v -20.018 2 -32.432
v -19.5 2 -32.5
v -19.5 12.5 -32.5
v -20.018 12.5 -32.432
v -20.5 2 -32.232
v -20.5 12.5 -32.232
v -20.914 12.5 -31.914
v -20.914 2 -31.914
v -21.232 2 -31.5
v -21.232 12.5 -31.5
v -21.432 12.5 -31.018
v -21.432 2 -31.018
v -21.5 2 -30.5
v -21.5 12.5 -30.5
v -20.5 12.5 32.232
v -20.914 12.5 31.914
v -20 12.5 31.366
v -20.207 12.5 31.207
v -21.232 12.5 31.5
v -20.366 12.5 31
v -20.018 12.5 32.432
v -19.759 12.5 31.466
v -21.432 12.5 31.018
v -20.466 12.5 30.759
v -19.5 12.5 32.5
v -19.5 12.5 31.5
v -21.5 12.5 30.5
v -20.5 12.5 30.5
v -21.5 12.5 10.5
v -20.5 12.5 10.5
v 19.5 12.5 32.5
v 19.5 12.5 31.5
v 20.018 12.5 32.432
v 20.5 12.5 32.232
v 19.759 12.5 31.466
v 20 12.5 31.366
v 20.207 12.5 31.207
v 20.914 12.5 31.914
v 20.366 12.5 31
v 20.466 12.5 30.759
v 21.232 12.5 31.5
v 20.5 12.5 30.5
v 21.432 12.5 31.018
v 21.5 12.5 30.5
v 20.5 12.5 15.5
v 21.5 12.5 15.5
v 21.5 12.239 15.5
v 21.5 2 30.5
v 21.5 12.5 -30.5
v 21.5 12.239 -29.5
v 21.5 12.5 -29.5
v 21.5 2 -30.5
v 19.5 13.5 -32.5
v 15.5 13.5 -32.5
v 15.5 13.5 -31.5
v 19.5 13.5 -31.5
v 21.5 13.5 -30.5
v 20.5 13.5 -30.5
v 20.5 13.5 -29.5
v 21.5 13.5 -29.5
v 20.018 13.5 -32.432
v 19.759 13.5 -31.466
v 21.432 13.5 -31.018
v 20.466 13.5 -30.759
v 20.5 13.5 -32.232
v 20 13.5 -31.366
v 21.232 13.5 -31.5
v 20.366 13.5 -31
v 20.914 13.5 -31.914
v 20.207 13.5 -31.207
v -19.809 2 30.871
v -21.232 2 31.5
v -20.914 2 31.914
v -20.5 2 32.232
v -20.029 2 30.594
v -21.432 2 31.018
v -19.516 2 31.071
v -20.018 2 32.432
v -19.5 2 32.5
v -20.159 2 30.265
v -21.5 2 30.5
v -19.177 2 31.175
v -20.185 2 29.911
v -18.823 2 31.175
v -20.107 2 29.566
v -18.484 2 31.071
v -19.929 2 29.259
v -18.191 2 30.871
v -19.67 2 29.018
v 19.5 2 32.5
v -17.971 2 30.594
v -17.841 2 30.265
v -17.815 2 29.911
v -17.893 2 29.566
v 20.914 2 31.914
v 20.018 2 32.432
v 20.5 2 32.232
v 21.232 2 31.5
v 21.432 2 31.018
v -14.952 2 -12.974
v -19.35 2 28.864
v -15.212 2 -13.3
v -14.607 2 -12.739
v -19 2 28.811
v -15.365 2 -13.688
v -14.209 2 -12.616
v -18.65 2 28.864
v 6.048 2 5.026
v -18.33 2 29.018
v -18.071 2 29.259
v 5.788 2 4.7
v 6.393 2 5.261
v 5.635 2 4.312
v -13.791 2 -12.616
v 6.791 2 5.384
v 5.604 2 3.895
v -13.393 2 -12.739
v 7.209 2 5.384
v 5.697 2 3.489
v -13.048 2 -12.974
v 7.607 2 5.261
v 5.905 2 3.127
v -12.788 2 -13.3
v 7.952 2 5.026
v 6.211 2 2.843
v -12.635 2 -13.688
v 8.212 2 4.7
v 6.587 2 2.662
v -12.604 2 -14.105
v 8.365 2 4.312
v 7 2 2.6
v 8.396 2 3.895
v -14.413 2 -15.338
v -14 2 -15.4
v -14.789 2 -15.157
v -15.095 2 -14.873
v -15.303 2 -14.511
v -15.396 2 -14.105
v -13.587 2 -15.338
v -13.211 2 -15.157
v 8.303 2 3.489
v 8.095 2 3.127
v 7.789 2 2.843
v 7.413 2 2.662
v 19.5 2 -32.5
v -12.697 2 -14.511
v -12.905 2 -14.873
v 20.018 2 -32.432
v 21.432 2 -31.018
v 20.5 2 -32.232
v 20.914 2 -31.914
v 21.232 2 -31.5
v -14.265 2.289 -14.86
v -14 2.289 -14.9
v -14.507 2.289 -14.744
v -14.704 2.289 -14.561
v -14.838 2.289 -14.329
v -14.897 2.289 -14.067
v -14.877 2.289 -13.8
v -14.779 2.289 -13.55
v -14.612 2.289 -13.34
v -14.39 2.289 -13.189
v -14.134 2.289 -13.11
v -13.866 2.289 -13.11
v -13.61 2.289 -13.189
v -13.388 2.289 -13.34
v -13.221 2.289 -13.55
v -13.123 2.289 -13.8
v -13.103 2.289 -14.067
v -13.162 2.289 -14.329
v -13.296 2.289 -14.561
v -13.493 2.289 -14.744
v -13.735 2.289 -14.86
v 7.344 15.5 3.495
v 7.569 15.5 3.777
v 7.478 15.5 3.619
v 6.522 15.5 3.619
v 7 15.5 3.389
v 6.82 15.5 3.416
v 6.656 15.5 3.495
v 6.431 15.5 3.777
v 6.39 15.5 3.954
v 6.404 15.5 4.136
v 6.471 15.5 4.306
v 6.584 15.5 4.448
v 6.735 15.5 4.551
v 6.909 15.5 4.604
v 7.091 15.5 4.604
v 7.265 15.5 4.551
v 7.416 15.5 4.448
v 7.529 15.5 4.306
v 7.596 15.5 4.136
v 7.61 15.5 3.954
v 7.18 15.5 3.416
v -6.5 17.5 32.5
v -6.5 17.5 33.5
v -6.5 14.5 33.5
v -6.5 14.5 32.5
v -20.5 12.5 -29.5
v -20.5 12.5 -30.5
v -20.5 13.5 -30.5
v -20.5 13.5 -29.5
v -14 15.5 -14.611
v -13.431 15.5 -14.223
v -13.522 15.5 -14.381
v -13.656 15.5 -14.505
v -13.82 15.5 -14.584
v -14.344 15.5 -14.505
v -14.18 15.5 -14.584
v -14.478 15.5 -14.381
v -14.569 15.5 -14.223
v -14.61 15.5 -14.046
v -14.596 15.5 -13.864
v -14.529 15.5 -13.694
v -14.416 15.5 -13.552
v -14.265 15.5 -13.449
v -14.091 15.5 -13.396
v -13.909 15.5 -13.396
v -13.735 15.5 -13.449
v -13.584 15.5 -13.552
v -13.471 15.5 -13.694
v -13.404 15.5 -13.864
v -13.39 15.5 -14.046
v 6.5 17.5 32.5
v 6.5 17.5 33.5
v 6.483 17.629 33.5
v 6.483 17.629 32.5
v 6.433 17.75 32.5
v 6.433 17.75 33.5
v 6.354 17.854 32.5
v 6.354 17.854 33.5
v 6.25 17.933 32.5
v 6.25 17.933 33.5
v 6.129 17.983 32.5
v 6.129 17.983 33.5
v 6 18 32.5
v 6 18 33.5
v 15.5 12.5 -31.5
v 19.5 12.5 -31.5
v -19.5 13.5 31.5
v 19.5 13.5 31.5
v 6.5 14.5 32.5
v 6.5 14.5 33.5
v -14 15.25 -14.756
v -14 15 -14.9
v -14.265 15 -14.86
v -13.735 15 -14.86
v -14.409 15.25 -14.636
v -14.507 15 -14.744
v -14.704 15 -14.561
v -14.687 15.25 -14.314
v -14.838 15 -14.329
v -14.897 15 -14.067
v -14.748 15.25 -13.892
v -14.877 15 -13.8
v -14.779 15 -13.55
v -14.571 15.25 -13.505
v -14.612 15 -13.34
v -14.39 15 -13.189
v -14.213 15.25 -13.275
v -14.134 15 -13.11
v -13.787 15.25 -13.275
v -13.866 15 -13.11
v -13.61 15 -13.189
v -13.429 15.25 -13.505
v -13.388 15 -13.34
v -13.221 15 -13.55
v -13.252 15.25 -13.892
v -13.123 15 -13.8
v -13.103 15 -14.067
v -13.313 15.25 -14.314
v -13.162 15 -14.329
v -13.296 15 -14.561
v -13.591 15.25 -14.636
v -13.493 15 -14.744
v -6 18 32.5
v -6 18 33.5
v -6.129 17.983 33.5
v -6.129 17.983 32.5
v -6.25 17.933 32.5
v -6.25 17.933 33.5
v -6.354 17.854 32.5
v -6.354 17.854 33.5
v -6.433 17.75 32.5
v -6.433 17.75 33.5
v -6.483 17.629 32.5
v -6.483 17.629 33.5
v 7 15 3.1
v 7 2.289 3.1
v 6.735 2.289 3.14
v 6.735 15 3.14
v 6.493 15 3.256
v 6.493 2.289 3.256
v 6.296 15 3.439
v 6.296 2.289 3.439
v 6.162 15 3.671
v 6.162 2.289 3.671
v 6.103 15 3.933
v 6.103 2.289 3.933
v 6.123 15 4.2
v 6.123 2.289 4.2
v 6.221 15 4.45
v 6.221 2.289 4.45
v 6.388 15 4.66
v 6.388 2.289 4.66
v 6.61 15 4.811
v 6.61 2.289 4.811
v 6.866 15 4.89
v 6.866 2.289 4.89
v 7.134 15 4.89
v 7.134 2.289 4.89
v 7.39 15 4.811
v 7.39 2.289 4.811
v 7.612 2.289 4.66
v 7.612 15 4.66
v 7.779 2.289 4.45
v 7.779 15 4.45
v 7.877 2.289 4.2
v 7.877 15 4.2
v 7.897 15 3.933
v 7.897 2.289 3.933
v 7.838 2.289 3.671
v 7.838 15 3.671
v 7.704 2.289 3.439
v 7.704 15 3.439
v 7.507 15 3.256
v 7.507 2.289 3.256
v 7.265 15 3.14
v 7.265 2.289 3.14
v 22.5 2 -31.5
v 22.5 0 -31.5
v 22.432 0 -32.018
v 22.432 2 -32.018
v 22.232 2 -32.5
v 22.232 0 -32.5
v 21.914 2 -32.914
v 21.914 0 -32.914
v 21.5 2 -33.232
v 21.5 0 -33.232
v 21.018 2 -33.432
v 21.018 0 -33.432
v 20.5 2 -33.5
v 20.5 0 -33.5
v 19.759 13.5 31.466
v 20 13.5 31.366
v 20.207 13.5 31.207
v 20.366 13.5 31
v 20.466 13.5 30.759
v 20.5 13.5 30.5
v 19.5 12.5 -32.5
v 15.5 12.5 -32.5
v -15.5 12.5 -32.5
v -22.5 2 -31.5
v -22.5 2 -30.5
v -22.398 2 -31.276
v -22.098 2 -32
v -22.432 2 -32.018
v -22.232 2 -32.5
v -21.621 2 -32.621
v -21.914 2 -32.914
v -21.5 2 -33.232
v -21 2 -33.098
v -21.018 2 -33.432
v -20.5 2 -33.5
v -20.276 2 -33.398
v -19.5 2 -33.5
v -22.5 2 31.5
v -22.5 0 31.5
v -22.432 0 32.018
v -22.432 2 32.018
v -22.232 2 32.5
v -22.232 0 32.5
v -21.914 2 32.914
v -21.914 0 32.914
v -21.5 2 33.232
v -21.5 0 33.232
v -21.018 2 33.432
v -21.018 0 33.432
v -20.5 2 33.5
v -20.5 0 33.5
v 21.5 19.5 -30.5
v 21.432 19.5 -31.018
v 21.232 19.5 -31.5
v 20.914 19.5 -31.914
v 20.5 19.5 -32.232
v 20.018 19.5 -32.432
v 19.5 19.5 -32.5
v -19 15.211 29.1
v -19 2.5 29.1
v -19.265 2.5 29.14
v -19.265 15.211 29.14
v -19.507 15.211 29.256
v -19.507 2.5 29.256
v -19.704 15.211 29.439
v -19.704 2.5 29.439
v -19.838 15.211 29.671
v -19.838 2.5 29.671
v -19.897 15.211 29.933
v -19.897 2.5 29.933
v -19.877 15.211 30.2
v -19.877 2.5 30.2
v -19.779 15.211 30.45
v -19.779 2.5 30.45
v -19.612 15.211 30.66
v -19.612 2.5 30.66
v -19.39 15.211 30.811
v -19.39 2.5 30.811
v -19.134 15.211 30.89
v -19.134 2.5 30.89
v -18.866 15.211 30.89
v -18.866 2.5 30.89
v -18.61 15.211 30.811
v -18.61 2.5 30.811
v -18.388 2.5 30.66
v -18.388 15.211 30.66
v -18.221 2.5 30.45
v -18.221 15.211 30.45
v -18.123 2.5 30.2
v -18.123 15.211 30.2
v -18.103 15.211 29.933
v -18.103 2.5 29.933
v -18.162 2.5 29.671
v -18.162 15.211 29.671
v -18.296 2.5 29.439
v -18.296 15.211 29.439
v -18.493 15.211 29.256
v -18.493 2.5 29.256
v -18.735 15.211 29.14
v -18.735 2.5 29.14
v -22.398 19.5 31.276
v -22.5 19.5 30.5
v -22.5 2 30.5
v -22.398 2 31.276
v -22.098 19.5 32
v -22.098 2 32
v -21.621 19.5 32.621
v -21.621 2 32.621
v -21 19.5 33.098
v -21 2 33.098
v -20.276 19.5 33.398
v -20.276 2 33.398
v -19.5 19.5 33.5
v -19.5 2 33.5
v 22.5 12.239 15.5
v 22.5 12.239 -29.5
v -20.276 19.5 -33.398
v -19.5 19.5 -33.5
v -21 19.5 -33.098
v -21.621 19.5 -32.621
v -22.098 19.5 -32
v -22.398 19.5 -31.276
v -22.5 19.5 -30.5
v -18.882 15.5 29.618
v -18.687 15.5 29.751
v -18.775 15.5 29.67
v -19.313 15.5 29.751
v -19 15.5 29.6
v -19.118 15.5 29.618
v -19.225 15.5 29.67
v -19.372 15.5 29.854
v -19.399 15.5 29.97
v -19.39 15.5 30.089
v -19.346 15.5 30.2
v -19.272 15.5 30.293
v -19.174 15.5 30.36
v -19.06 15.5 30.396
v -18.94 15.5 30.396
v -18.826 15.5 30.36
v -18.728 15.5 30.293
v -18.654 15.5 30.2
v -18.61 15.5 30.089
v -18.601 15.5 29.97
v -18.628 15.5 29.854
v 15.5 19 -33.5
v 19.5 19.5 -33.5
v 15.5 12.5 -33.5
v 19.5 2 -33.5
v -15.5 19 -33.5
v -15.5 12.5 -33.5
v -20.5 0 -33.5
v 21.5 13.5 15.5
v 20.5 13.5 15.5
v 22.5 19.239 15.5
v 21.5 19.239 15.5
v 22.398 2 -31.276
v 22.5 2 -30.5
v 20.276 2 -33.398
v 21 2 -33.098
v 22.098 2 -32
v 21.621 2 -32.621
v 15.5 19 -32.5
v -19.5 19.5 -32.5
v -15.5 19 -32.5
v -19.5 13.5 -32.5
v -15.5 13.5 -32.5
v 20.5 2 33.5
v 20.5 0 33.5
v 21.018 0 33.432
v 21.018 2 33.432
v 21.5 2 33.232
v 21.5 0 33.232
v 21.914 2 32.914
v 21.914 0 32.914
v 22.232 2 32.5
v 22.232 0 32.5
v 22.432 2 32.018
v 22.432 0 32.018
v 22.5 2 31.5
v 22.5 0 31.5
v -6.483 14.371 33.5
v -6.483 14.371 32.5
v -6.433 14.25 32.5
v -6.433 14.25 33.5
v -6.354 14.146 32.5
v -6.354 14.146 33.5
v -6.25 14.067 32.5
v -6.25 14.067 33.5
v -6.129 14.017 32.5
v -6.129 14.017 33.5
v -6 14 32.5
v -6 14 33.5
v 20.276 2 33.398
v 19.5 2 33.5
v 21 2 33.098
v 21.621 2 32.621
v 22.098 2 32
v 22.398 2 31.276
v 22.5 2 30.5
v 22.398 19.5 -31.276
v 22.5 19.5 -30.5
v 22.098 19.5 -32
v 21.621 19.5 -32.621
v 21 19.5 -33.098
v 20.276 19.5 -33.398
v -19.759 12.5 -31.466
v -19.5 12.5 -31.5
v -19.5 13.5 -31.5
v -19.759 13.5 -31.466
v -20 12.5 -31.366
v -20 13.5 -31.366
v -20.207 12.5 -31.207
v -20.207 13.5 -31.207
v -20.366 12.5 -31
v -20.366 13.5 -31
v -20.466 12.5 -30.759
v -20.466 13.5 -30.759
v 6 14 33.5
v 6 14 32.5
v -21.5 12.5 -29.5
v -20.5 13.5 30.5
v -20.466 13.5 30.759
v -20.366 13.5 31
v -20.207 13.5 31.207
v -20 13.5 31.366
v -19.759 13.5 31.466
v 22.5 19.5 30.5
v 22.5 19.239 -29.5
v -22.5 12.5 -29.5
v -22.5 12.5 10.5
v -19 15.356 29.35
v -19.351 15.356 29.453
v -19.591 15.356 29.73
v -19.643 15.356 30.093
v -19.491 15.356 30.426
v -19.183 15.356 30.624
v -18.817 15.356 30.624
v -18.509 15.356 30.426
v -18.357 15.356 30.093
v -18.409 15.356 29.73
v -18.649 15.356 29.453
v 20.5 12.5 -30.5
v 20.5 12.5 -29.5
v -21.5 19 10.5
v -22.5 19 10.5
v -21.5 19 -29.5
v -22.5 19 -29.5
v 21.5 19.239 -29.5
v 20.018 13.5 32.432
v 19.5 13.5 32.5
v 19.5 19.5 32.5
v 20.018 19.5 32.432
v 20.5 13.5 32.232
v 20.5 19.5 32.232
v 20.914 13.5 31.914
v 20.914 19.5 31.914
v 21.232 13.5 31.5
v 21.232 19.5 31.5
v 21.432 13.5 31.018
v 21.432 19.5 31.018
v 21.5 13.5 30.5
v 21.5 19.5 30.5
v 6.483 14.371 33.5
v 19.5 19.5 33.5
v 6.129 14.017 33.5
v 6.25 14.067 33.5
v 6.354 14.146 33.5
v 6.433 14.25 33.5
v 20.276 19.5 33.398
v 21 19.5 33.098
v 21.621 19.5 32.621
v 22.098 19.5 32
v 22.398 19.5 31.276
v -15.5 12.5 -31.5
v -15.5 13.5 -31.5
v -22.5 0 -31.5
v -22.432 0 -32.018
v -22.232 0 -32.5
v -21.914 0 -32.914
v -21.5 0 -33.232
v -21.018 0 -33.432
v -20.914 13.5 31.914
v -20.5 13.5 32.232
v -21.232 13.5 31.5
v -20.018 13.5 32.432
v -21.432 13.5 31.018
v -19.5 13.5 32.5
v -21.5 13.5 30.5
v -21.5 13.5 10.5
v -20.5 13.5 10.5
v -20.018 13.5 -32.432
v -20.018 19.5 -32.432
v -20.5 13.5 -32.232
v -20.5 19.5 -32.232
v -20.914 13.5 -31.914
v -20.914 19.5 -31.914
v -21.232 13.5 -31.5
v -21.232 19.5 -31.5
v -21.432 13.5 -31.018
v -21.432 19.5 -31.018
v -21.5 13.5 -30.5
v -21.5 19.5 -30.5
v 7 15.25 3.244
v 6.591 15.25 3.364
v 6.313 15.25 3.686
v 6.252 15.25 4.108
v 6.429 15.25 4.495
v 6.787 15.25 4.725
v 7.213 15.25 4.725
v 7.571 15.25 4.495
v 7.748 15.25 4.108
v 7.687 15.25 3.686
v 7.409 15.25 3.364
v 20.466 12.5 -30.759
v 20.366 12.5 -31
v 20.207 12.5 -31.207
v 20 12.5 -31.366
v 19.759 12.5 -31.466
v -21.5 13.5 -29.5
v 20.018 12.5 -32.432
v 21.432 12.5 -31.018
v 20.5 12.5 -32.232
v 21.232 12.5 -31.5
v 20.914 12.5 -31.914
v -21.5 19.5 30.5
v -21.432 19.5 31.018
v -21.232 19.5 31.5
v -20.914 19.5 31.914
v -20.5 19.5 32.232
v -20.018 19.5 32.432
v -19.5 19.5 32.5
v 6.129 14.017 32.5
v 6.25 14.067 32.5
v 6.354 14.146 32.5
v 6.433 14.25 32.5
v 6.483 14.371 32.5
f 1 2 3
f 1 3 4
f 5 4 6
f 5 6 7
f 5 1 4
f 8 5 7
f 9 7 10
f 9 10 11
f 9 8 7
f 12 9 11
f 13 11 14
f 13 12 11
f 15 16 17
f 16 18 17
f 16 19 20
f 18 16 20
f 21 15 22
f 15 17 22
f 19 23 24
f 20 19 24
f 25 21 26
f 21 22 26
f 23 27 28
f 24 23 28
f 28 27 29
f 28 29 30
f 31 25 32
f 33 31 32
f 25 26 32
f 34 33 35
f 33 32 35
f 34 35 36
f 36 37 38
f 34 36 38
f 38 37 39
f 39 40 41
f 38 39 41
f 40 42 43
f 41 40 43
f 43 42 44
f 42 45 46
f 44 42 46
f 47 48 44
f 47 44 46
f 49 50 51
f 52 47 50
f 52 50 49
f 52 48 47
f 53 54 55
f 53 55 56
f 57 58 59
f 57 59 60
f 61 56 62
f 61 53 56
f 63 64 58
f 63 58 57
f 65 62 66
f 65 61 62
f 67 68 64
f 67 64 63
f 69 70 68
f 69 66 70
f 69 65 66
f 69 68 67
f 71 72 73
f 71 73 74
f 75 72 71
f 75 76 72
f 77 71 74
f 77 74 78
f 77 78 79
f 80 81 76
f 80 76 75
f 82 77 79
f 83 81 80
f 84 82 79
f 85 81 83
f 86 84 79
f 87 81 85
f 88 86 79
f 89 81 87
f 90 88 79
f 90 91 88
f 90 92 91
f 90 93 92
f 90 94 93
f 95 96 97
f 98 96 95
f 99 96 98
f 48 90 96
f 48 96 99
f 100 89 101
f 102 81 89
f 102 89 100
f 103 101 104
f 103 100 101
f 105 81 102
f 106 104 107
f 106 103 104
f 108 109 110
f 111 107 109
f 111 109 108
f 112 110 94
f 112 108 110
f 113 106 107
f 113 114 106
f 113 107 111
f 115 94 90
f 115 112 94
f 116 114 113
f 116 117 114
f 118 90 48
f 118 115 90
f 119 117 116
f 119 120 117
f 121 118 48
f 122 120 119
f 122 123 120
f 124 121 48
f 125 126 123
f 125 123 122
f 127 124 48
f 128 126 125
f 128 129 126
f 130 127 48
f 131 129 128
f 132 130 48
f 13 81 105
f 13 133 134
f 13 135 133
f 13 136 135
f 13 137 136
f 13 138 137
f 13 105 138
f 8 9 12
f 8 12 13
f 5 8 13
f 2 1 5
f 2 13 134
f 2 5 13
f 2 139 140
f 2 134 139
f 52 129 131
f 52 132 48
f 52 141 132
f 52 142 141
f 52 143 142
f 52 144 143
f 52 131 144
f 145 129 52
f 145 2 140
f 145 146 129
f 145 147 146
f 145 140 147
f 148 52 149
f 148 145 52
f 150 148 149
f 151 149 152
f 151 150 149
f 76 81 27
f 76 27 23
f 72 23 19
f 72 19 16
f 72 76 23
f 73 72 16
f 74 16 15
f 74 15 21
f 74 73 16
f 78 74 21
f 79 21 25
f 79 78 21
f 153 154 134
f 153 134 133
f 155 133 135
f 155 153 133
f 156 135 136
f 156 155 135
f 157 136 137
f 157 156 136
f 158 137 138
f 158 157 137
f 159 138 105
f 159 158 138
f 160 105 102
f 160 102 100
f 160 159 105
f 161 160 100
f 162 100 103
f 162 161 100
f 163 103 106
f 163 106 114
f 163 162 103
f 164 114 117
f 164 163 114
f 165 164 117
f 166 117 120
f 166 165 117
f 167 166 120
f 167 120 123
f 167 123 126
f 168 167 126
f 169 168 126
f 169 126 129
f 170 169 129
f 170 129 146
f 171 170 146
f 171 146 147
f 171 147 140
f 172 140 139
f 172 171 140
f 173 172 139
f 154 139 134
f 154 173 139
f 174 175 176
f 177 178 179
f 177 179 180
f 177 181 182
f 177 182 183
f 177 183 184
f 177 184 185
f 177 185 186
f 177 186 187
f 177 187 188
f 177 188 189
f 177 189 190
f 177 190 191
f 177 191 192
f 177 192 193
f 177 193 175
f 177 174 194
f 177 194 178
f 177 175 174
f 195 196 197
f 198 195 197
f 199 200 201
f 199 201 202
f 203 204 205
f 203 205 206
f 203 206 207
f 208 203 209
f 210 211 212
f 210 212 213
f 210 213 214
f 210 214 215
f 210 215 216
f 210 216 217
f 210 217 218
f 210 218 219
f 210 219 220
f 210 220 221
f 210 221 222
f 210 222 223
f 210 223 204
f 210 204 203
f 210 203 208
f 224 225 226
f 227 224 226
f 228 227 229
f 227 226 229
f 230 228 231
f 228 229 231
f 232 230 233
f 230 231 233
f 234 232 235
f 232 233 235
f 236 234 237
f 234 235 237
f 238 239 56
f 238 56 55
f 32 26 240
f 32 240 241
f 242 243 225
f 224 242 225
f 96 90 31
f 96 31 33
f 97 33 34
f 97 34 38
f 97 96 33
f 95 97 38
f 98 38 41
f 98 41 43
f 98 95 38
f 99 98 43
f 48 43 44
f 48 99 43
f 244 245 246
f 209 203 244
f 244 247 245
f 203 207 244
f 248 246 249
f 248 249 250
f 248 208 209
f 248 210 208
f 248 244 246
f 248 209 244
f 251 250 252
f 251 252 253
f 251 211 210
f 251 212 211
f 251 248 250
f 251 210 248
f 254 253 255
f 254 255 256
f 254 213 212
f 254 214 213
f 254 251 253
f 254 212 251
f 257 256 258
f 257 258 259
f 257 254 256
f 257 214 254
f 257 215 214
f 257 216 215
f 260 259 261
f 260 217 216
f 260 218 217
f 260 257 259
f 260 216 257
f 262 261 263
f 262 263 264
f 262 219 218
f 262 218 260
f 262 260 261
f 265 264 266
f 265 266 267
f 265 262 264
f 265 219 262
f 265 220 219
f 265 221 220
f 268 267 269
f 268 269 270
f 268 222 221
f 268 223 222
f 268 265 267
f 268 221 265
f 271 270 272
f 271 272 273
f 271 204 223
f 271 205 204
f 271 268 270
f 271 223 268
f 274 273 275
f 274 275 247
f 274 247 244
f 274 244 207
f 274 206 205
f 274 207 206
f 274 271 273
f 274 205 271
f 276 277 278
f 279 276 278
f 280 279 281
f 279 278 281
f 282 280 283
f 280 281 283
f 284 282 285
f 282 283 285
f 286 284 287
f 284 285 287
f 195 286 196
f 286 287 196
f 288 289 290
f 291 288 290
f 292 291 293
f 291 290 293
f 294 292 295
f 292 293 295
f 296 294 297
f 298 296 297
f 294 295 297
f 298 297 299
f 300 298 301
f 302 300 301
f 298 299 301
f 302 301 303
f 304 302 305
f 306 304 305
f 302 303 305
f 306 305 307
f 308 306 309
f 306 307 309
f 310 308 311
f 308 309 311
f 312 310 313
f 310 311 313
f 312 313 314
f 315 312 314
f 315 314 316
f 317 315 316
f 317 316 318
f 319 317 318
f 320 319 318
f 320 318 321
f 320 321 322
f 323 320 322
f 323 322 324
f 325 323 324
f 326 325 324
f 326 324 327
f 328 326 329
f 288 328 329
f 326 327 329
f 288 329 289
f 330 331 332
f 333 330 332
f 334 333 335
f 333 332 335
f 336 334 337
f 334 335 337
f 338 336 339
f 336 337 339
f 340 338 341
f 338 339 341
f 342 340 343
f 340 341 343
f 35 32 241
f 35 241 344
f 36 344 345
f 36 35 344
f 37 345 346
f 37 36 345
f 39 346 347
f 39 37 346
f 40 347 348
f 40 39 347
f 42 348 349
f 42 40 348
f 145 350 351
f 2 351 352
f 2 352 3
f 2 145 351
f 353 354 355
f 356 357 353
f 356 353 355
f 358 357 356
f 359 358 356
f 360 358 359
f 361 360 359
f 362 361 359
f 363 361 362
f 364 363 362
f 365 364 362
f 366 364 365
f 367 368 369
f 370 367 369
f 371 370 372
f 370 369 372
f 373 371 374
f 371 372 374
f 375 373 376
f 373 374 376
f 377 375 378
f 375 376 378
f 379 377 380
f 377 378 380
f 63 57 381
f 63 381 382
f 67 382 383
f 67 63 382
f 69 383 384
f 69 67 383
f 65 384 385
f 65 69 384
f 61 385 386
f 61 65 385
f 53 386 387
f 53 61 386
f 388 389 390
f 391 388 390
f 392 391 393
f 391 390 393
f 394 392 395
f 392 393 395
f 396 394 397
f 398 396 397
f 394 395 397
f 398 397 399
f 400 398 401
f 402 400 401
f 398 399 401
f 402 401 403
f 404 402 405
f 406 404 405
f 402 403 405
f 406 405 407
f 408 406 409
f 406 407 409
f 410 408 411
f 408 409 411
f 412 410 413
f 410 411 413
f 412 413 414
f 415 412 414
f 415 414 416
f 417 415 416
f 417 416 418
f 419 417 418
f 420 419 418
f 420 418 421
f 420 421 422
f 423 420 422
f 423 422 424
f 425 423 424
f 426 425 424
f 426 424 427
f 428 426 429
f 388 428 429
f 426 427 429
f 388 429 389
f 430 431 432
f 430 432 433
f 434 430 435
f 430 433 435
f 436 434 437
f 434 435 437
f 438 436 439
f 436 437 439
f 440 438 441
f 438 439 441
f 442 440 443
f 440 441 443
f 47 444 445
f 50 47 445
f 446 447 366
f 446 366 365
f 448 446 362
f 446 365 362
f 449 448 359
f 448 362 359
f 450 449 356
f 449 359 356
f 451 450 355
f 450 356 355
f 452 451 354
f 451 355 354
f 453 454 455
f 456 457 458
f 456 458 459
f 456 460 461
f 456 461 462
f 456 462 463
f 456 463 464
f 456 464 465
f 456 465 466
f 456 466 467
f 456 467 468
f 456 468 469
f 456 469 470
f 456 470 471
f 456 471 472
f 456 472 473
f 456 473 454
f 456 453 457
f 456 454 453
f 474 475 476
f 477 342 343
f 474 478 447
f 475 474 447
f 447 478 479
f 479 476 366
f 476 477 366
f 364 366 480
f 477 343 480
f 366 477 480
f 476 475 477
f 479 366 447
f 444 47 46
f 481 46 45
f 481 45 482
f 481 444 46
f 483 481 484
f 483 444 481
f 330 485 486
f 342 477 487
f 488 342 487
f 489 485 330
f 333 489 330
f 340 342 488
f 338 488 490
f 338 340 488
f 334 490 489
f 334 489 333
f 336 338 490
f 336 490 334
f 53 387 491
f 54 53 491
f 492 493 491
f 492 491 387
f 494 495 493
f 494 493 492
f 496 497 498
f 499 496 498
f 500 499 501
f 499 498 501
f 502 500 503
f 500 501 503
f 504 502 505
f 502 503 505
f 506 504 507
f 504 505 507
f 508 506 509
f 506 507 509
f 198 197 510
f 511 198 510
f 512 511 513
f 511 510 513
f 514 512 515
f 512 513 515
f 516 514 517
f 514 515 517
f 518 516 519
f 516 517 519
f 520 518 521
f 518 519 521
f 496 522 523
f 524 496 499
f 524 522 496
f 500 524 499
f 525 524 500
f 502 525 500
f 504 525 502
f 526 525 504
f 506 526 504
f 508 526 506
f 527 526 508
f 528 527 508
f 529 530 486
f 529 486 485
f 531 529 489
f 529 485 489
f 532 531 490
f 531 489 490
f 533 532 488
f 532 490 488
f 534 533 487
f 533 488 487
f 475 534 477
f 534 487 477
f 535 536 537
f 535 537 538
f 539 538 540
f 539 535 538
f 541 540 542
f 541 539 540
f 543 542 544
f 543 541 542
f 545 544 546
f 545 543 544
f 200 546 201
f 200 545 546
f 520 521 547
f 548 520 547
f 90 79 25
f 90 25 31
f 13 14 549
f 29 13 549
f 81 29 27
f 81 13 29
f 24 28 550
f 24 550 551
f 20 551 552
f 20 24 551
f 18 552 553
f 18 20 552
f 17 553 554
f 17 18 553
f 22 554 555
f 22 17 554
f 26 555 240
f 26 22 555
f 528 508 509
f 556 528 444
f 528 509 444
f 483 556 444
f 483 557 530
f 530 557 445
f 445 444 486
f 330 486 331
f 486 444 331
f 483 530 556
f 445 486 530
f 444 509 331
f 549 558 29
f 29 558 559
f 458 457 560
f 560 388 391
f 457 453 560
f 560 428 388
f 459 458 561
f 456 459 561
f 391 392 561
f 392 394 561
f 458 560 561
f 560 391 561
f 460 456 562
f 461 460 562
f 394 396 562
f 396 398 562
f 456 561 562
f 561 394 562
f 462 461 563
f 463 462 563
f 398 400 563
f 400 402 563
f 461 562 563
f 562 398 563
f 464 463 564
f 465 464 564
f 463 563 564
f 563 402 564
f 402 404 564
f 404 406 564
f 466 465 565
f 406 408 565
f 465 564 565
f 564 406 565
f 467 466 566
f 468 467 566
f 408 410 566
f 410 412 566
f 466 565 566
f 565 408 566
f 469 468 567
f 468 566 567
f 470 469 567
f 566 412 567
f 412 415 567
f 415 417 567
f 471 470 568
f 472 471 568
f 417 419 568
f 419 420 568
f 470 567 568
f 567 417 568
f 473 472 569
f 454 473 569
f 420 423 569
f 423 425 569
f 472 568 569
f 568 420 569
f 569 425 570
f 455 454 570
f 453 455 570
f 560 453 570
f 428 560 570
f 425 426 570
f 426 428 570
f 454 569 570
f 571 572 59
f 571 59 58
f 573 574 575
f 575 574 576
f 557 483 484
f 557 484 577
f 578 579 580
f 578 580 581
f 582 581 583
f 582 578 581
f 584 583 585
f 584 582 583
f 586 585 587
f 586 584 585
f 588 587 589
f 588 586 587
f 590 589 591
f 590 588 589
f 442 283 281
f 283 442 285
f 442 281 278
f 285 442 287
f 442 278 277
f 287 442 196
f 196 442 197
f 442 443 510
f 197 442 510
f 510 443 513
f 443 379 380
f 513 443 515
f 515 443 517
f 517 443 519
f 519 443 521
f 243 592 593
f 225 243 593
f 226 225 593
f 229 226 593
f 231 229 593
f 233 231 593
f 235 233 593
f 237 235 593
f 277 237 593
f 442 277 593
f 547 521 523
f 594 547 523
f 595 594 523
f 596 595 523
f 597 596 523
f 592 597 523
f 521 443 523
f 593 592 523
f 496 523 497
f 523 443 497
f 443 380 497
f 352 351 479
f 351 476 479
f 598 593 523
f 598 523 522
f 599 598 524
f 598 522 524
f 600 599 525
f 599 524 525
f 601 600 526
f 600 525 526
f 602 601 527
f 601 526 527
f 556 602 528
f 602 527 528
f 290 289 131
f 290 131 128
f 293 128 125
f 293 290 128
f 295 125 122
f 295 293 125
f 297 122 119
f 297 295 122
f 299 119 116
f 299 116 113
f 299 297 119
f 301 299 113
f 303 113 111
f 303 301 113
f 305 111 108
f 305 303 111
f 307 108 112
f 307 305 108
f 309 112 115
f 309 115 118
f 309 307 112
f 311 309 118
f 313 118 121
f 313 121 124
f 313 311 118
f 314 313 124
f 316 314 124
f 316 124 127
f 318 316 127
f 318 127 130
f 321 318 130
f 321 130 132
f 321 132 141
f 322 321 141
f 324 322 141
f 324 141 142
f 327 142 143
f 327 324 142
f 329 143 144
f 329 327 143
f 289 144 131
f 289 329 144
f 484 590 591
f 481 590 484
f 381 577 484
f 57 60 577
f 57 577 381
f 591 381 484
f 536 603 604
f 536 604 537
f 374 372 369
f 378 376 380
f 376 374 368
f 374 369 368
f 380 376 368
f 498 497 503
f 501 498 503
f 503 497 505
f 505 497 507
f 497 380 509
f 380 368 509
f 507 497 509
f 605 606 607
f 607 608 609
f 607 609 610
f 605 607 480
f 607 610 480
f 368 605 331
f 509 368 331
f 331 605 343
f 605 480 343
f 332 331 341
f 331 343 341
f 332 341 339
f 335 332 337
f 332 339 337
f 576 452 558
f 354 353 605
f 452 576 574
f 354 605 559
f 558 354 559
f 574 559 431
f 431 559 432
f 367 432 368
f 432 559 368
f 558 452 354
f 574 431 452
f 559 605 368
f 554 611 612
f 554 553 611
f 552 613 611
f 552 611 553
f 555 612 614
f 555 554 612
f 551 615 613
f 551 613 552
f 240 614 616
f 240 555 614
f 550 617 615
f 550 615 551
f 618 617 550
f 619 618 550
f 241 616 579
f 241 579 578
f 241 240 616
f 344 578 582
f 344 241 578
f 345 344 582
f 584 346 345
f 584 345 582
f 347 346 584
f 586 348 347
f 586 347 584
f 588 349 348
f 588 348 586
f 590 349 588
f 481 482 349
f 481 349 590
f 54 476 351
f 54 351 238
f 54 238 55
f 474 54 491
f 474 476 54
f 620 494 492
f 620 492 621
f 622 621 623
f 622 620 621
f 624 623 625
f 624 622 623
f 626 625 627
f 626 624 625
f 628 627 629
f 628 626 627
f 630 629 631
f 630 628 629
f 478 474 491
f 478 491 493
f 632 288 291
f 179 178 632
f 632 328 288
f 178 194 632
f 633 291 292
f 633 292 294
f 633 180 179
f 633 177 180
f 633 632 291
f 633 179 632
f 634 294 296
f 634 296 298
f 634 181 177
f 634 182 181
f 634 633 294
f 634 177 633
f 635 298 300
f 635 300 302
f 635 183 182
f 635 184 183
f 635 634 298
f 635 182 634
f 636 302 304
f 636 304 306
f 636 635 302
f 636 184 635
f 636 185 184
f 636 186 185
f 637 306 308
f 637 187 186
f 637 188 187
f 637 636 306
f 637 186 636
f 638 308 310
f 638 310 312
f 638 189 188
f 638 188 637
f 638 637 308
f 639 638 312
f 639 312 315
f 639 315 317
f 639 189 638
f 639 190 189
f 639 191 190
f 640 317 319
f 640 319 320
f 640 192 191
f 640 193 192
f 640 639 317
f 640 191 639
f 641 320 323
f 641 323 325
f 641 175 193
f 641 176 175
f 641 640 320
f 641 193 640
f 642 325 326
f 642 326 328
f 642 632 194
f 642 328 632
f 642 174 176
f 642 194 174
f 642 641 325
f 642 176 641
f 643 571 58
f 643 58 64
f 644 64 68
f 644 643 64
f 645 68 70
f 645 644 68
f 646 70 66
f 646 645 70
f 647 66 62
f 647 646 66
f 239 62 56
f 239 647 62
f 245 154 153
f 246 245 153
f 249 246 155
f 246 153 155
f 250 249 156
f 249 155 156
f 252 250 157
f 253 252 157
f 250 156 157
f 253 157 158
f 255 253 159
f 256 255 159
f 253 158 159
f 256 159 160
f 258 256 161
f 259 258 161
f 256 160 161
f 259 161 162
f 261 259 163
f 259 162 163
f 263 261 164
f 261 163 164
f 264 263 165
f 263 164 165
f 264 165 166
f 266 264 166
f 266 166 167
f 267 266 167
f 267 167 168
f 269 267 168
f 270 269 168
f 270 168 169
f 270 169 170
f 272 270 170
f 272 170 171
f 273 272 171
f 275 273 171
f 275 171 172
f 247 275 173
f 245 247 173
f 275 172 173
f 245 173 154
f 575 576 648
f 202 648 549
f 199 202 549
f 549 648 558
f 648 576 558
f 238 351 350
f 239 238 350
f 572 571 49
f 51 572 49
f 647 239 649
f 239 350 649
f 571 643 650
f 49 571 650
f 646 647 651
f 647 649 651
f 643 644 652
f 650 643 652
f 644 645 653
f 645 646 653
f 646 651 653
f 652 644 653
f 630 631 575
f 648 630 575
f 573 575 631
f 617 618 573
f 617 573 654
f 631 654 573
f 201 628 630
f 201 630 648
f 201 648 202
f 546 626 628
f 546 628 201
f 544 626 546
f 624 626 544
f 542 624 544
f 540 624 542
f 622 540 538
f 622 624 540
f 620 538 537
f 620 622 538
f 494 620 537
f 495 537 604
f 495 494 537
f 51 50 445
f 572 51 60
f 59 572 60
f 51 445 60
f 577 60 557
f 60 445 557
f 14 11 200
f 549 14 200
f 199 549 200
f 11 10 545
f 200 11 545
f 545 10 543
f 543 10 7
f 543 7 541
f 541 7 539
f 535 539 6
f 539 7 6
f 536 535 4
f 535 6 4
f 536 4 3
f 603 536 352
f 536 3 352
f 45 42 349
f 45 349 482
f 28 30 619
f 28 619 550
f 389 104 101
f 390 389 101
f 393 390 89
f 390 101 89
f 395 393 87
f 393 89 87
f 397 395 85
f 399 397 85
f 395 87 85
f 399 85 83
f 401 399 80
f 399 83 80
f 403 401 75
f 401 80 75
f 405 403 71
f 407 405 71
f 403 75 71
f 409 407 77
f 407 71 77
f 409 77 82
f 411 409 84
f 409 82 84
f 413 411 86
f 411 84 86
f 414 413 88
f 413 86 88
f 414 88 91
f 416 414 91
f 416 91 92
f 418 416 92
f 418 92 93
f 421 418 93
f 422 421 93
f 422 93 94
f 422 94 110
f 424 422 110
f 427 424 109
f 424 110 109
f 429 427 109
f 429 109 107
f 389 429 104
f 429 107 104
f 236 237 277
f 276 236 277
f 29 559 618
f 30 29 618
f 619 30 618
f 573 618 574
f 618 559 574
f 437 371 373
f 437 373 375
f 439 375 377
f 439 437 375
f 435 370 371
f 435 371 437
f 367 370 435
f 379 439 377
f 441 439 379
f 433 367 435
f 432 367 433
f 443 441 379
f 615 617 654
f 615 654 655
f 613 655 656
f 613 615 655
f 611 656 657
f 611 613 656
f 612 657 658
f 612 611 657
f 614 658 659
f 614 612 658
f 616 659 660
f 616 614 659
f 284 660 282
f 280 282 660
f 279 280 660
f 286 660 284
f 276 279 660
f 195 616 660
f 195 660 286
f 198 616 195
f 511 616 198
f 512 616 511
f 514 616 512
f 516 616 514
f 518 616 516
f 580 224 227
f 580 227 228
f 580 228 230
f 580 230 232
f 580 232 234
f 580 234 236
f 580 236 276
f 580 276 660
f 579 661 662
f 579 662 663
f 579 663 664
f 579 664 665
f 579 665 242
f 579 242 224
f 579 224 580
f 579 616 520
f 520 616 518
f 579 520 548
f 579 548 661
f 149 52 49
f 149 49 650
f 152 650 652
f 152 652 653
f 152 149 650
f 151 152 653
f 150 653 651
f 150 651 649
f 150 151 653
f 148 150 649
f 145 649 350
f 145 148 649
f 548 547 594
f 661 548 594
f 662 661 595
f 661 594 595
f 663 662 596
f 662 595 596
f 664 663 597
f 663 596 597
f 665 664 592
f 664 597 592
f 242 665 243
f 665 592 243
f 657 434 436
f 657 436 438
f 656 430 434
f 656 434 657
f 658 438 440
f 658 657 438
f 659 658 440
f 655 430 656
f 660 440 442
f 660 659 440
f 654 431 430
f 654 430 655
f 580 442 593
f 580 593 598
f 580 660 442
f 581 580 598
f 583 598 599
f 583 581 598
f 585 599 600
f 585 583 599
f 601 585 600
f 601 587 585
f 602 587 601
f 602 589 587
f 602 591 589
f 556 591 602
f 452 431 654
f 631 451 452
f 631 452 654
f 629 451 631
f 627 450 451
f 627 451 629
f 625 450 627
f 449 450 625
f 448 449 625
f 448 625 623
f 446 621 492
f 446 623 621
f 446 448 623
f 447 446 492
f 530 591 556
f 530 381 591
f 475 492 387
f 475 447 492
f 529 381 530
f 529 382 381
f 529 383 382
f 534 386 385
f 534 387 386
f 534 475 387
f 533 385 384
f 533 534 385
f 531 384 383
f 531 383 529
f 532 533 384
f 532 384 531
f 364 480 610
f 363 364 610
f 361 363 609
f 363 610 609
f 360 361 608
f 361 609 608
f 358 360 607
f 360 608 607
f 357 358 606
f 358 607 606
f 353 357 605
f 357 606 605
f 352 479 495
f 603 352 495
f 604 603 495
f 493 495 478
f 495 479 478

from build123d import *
from OCP.BRepFilletAPI import BRepFilletAPI_MakeChamfer

# Parameters (mm, degrees)
EXTRUDE_1_DEPTH     = 2
EXTRUDE_2_DEPTH     = 17.5
SKETCH_3_R          = 0.9
EXTRUDE_3_DEPTH     = 13.5
CHAMFER_2_SIZE      = 0.5
CHAMFER_2_SIZE2     = 0.288675135
CHAMFER_3_SIZE      = 0.5
CHAMFER_3_SIZE2     = 0.288675135
CHAMFER_4_SIZE      = 0.5
CHAMFER_4_SIZE2     = 0.288675135
EXTRUDE_5_DEPTH     = 1
CUT_EXTRUDE_1_REACH = 75.318
CUT_EXTRUDE_2_REACH = 61.393
SKETCH_7_W          = 45
SKETCH_7_H          = 7
CUT_EXTRUDE_3_REACH = 61.393
CUT_EXTRUDE_4_REACH = 75.318
SKETCH_9_W          = 31
SKETCH_9_H          = 6.5


with BuildPart() as part:
    # 草图1 → 凸台-拉伸1 (new body)
    with BuildSketch(Plane(origin=(0, 0, 0), x_dir=(1, 0, 0), z_dir=(0, 1, 0))):
        with BuildLine():
            Line((-22.5, 31.5), (-22.5, -31.5))
            ThreePointArc((-22.5, -31.5), (-21.914213562, -32.914213562), (-20.5, -33.5))
            Line((-20.5, -33.5), (20.5, -33.5))
            ThreePointArc((20.5, -33.5), (21.914213562, -32.914213562), (22.5, -31.5))
            Line((22.5, -31.5), (22.5, 31.5))
            ThreePointArc((22.5, 31.5), (21.914213562, 32.914213562), (20.5, 33.5))
            Line((20.5, 33.5), (-20.5, 33.5))
            ThreePointArc((-20.5, 33.5), (-21.914213562, 32.914213562), (-22.5, 31.5))
        make_face()
    extrude(amount=EXTRUDE_1_DEPTH)

    # 草图2 → 凸台-拉伸2 (add)
    with BuildSketch(Plane(origin=(0, 2, 0), x_dir=(1, 0, 0), z_dir=(0, 1, 0))):
        with BuildLine():
            Line((19.5, 33.5), (-19.5, 33.5))
            ThreePointArc((-19.5, 33.5), (-21.621320344, 32.621320344), (-22.5, 30.5))
            Line((-22.5, 30.5), (-22.5, -30.5))
            ThreePointArc((-22.5, -30.5), (-21.621320344, -32.621320344), (-19.5, -33.5))
            Line((-19.5, -33.5), (19.5, -33.5))
            ThreePointArc((19.5, -33.5), (21.621320344, -32.621320344), (22.5, -30.5))
            Line((22.5, -30.5), (22.5, 30.5))
            ThreePointArc((22.5, 30.5), (21.621320344, 32.621320344), (19.5, 33.5))
        make_face()
        with BuildLine():
            Line((-21.5, 30.5), (-21.5, -30.5))
            ThreePointArc((-21.5, -30.5), (-20.914213562, -31.914213562), (-19.5, -32.5))
            Line((-19.5, -32.5), (19.5, -32.5))
            ThreePointArc((19.5, -32.5), (20.914213562, -31.914213562), (21.5, -30.5))
            Line((21.5, -30.5), (21.5, 30.5))
            ThreePointArc((21.5, 30.5), (20.914213562, 31.914213562), (19.5, 32.5))
            Line((19.5, 32.5), (-19.5, 32.5))
            ThreePointArc((-19.5, 32.5), (-20.914213562, 31.914213562), (-21.5, 30.5))
        make_face(mode=Mode.SUBTRACT)
    extrude(amount=EXTRUDE_2_DEPTH)

    # 草图3 → 凸台-拉伸3 (add)
    with BuildSketch(Plane(origin=(0, 2, 0), x_dir=(1, 0, 0), z_dir=(0, 1, 0))):
        with Locations(Location((-14, 14, 0), (0, 0, 90))):
            Circle(SKETCH_3_R)
        with Locations(Location((7, -4, 0), (0, 0, 90))):
            Circle(SKETCH_3_R)
        with Locations(Location((-19, -30, 0), (0, 0, 90))):
            Circle(SKETCH_3_R)
    extrude(amount=EXTRUDE_3_DEPTH)

    # 倒角2: one chamfer whose edges measure the first distance from different faces: ONE call of the kernel's chamfer builder (chamfer() names one face for all edges)
    chamfer_2_edges_1 = [part.edges().sort_by_distance(p)[0] for p in [
        (-14, 2, -13.1),
    ]]
    chamfer_2_side_1 = [part.faces().sort_by_distance(p)[0] for p in [
        (0.023765643, 2, -0.018281264),
    ]]
    chamfer_2_edges_2 = [part.edges().sort_by_distance(p)[0] for p in [
        (-14, 15.5, -13.1),
    ]]
    chamfer_2_side_2 = [part.faces().sort_by_distance(p)[0] for p in [
        (-14, 8.75, -13.1),
    ]]
    chamfer_2 = BRepFilletAPI_MakeChamfer(part.part.solid().wrapped)
    for e in chamfer_2_edges_1:
        chamfer_2.Add(CHAMFER_2_SIZE, CHAMFER_2_SIZE2, e.wrapped, chamfer_2_side_1[0].wrapped)  # the first distance lies on this face
    for e in chamfer_2_edges_2:
        chamfer_2.Add(CHAMFER_2_SIZE, CHAMFER_2_SIZE2, e.wrapped, chamfer_2_side_2[0].wrapped)  # the first distance lies on this face
    add(Compound.cast(chamfer_2.Shape()), mode=Mode.REPLACE)

    # 倒角3: one chamfer whose edges measure the first distance from different faces: ONE call of the kernel's chamfer builder (chamfer() names one face for all edges)
    chamfer_3_edges_1 = [part.edges().sort_by_distance(p)[0] for p in [
        (7, 2, 4.9),
    ]]
    chamfer_3_side_1 = [part.faces().sort_by_distance(p)[0] for p in [
        (0.04198855, 2, -0.000112994),
    ]]
    chamfer_3_edges_2 = [part.edges().sort_by_distance(p)[0] for p in [
        (7, 15.5, 4.9),
    ]]
    chamfer_3_side_2 = [part.faces().sort_by_distance(p)[0] for p in [
        (7, 8.75, 4.9),
    ]]
    chamfer_3 = BRepFilletAPI_MakeChamfer(part.part.solid().wrapped)
    for e in chamfer_3_edges_1:
        chamfer_3.Add(CHAMFER_3_SIZE, CHAMFER_3_SIZE2, e.wrapped, chamfer_3_side_1[0].wrapped)  # the first distance lies on this face
    for e in chamfer_3_edges_2:
        chamfer_3.Add(CHAMFER_3_SIZE, CHAMFER_3_SIZE2, e.wrapped, chamfer_3_side_2[0].wrapped)  # the first distance lies on this face
    add(Compound.cast(chamfer_3.Shape()), mode=Mode.REPLACE)

    # 倒角4: one chamfer whose edges measure the first distance from different faces: ONE call of the kernel's chamfer builder (chamfer() names one face for all edges)
    chamfer_4_edges_1 = [part.edges().sort_by_distance(p)[0] for p in [
        (-19, 2, 30.9),
    ]]
    chamfer_4_side_1 = [part.faces().sort_by_distance(p)[0] for p in [
        (-19, 8.75, 30.9),
    ]]
    chamfer_4_edges_2 = [part.edges().sort_by_distance(p)[0] for p in [
        (-19, 15.5, 30.9),
    ]]
    chamfer_4_side_2 = [part.faces().sort_by_distance(p)[0] for p in [
        (-19, 15.5, 30),
    ]]
    chamfer_4 = BRepFilletAPI_MakeChamfer(part.part.solid().wrapped)
    for e in chamfer_4_edges_1:
        chamfer_4.Add(CHAMFER_4_SIZE, CHAMFER_4_SIZE2, e.wrapped, chamfer_4_side_1[0].wrapped)  # the first distance lies on this face
    for e in chamfer_4_edges_2:
        chamfer_4.Add(CHAMFER_4_SIZE, CHAMFER_4_SIZE2, e.wrapped, chamfer_4_side_2[0].wrapped)  # the first distance lies on this face
    add(Compound.cast(chamfer_4.Shape()), mode=Mode.REPLACE)

    # 草图6 → 凸台-拉伸5 (add)
    with BuildSketch(Plane(origin=(0, 12.5, 0), x_dir=(1, 0, 0), z_dir=(0, 1, 0))):
        with BuildLine():
            Line((-21.5, 30.5), (-21.5, -30.5))
            ThreePointArc((-21.5, -30.5), (-20.914213562, -31.914213562), (-19.5, -32.5))
            Line((-19.5, -32.5), (19.5, -32.5))
            ThreePointArc((19.5, -32.5), (20.914213562, -31.914213562), (21.5, -30.5))
            Line((21.5, -30.5), (21.5, 30.5))
            ThreePointArc((21.5, 30.5), (20.914213562, 31.914213562), (19.5, 32.5))
            Line((19.5, 32.5), (-19.5, 32.5))
            ThreePointArc((-19.5, 32.5), (-20.914213562, 31.914213562), (-21.5, 30.5))
        make_face()
        with BuildLine():
            Line((19.5, 31.5), (-19.5, 31.5))
            ThreePointArc((-19.5, 31.5), (-20.207106781, 31.207106781), (-20.5, 30.5))
            Line((-20.5, 30.5), (-20.5, -30.5))
            ThreePointArc((-20.5, -30.5), (-20.207106781, -31.207106781), (-19.5, -31.5))
            Line((-19.5, -31.5), (19.5, -31.5))
            ThreePointArc((19.5, -31.5), (20.207106781, -31.207106781), (20.5, -30.5))
            Line((20.5, -30.5), (20.5, 30.5))
            ThreePointArc((20.5, 30.5), (20.207106781, 31.207106781), (19.5, 31.5))
        make_face(mode=Mode.SUBTRACT)
    extrude(amount=EXTRUDE_5_DEPTH)

    # 草图4 → 切除-拉伸1 (cut, up to next)
    with BuildSketch(Plane.XY.offset(33.5), mode=Mode.PRIVATE) as cut_extrude_1_sk1:
        with BuildLine():
            Line((-6.5, 17.5), (-6.5, 14.5))
            ThreePointArc((-6.5, 14.5), (-6.353553391, 14.146446609), (-6, 14))
            Line((-6, 14), (6, 14))
            ThreePointArc((6, 14), (6.353553391, 14.146446609), (6.5, 14.5))
            Line((6.5, 14.5), (6.5, 17.5))
            ThreePointArc((6.5, 17.5), (6.353553391, 17.853553391), (6, 18))
            Line((6, 18), (-6, 18))
            ThreePointArc((-6, 18), (-6.353553391, 17.853553391), (-6.5, 17.5))
        make_face()
    cut_extrude_1_tool1 = extrude(cut_extrude_1_sk1.sketch, amount=-CUT_EXTRUDE_1_REACH, mode=Mode.PRIVATE) & part.part
    add(cut_extrude_1_tool1.solids().sort_by_distance((0, 16, 33.5))[0], mode=Mode.SUBTRACT)

    # 草图7 → 切除-拉伸2 (cut, up to next)
    with BuildSketch(Plane(origin=(22.5, 0, 0), x_dir=(0, 0, -1), z_dir=(1, 0, 0)), mode=Mode.PRIVATE) as cut_extrude_2_sk1:
        with Locations((7, 15.73884151)):
            Rectangle(SKETCH_7_W, SKETCH_7_H)
    cut_extrude_2_tool1 = extrude(cut_extrude_2_sk1.sketch, amount=-CUT_EXTRUDE_2_REACH, mode=Mode.PRIVATE) & part.part
    add(cut_extrude_2_tool1.solids().sort_by_distance((22.5, 15.738842, -7))[0], mode=Mode.SUBTRACT)

    # 草图8 → 切除-拉伸3 (cut, up to next)
    with BuildSketch(Plane.ZY.offset(22.5), mode=Mode.PRIVATE) as cut_extrude_3_sk1:
        Polygon((-29.5, 19), (-29.5, 12.5), (10.5, 12.5), (10.5, 15.014135881), (10.5, 19), align=None)
    cut_extrude_3_tool1 = extrude(cut_extrude_3_sk1.sketch, amount=-CUT_EXTRUDE_3_REACH, mode=Mode.PRIVATE) & part.part
    add(cut_extrude_3_tool1.solids().sort_by_distance((-22.5, 15.75, -9.5))[0], mode=Mode.SUBTRACT)

    # 草图9 → 切除-拉伸4 (cut, up to next)
    with BuildSketch(Plane(origin=(0, 0, -33.5), x_dir=(-1, 0, 0), z_dir=(0, 0, -1)), mode=Mode.PRIVATE) as cut_extrude_4_sk1:
        with Locations((0, 15.75)):
            Rectangle(SKETCH_9_W, SKETCH_9_H)
    cut_extrude_4_tool1 = extrude(cut_extrude_4_sk1.sketch, amount=-CUT_EXTRUDE_4_REACH, mode=Mode.PRIVATE) & part.part
    add(cut_extrude_4_tool1.solids().sort_by_distance((0, 15.75, -33.5))[0], mode=Mode.SUBTRACT)


solid = part.part
